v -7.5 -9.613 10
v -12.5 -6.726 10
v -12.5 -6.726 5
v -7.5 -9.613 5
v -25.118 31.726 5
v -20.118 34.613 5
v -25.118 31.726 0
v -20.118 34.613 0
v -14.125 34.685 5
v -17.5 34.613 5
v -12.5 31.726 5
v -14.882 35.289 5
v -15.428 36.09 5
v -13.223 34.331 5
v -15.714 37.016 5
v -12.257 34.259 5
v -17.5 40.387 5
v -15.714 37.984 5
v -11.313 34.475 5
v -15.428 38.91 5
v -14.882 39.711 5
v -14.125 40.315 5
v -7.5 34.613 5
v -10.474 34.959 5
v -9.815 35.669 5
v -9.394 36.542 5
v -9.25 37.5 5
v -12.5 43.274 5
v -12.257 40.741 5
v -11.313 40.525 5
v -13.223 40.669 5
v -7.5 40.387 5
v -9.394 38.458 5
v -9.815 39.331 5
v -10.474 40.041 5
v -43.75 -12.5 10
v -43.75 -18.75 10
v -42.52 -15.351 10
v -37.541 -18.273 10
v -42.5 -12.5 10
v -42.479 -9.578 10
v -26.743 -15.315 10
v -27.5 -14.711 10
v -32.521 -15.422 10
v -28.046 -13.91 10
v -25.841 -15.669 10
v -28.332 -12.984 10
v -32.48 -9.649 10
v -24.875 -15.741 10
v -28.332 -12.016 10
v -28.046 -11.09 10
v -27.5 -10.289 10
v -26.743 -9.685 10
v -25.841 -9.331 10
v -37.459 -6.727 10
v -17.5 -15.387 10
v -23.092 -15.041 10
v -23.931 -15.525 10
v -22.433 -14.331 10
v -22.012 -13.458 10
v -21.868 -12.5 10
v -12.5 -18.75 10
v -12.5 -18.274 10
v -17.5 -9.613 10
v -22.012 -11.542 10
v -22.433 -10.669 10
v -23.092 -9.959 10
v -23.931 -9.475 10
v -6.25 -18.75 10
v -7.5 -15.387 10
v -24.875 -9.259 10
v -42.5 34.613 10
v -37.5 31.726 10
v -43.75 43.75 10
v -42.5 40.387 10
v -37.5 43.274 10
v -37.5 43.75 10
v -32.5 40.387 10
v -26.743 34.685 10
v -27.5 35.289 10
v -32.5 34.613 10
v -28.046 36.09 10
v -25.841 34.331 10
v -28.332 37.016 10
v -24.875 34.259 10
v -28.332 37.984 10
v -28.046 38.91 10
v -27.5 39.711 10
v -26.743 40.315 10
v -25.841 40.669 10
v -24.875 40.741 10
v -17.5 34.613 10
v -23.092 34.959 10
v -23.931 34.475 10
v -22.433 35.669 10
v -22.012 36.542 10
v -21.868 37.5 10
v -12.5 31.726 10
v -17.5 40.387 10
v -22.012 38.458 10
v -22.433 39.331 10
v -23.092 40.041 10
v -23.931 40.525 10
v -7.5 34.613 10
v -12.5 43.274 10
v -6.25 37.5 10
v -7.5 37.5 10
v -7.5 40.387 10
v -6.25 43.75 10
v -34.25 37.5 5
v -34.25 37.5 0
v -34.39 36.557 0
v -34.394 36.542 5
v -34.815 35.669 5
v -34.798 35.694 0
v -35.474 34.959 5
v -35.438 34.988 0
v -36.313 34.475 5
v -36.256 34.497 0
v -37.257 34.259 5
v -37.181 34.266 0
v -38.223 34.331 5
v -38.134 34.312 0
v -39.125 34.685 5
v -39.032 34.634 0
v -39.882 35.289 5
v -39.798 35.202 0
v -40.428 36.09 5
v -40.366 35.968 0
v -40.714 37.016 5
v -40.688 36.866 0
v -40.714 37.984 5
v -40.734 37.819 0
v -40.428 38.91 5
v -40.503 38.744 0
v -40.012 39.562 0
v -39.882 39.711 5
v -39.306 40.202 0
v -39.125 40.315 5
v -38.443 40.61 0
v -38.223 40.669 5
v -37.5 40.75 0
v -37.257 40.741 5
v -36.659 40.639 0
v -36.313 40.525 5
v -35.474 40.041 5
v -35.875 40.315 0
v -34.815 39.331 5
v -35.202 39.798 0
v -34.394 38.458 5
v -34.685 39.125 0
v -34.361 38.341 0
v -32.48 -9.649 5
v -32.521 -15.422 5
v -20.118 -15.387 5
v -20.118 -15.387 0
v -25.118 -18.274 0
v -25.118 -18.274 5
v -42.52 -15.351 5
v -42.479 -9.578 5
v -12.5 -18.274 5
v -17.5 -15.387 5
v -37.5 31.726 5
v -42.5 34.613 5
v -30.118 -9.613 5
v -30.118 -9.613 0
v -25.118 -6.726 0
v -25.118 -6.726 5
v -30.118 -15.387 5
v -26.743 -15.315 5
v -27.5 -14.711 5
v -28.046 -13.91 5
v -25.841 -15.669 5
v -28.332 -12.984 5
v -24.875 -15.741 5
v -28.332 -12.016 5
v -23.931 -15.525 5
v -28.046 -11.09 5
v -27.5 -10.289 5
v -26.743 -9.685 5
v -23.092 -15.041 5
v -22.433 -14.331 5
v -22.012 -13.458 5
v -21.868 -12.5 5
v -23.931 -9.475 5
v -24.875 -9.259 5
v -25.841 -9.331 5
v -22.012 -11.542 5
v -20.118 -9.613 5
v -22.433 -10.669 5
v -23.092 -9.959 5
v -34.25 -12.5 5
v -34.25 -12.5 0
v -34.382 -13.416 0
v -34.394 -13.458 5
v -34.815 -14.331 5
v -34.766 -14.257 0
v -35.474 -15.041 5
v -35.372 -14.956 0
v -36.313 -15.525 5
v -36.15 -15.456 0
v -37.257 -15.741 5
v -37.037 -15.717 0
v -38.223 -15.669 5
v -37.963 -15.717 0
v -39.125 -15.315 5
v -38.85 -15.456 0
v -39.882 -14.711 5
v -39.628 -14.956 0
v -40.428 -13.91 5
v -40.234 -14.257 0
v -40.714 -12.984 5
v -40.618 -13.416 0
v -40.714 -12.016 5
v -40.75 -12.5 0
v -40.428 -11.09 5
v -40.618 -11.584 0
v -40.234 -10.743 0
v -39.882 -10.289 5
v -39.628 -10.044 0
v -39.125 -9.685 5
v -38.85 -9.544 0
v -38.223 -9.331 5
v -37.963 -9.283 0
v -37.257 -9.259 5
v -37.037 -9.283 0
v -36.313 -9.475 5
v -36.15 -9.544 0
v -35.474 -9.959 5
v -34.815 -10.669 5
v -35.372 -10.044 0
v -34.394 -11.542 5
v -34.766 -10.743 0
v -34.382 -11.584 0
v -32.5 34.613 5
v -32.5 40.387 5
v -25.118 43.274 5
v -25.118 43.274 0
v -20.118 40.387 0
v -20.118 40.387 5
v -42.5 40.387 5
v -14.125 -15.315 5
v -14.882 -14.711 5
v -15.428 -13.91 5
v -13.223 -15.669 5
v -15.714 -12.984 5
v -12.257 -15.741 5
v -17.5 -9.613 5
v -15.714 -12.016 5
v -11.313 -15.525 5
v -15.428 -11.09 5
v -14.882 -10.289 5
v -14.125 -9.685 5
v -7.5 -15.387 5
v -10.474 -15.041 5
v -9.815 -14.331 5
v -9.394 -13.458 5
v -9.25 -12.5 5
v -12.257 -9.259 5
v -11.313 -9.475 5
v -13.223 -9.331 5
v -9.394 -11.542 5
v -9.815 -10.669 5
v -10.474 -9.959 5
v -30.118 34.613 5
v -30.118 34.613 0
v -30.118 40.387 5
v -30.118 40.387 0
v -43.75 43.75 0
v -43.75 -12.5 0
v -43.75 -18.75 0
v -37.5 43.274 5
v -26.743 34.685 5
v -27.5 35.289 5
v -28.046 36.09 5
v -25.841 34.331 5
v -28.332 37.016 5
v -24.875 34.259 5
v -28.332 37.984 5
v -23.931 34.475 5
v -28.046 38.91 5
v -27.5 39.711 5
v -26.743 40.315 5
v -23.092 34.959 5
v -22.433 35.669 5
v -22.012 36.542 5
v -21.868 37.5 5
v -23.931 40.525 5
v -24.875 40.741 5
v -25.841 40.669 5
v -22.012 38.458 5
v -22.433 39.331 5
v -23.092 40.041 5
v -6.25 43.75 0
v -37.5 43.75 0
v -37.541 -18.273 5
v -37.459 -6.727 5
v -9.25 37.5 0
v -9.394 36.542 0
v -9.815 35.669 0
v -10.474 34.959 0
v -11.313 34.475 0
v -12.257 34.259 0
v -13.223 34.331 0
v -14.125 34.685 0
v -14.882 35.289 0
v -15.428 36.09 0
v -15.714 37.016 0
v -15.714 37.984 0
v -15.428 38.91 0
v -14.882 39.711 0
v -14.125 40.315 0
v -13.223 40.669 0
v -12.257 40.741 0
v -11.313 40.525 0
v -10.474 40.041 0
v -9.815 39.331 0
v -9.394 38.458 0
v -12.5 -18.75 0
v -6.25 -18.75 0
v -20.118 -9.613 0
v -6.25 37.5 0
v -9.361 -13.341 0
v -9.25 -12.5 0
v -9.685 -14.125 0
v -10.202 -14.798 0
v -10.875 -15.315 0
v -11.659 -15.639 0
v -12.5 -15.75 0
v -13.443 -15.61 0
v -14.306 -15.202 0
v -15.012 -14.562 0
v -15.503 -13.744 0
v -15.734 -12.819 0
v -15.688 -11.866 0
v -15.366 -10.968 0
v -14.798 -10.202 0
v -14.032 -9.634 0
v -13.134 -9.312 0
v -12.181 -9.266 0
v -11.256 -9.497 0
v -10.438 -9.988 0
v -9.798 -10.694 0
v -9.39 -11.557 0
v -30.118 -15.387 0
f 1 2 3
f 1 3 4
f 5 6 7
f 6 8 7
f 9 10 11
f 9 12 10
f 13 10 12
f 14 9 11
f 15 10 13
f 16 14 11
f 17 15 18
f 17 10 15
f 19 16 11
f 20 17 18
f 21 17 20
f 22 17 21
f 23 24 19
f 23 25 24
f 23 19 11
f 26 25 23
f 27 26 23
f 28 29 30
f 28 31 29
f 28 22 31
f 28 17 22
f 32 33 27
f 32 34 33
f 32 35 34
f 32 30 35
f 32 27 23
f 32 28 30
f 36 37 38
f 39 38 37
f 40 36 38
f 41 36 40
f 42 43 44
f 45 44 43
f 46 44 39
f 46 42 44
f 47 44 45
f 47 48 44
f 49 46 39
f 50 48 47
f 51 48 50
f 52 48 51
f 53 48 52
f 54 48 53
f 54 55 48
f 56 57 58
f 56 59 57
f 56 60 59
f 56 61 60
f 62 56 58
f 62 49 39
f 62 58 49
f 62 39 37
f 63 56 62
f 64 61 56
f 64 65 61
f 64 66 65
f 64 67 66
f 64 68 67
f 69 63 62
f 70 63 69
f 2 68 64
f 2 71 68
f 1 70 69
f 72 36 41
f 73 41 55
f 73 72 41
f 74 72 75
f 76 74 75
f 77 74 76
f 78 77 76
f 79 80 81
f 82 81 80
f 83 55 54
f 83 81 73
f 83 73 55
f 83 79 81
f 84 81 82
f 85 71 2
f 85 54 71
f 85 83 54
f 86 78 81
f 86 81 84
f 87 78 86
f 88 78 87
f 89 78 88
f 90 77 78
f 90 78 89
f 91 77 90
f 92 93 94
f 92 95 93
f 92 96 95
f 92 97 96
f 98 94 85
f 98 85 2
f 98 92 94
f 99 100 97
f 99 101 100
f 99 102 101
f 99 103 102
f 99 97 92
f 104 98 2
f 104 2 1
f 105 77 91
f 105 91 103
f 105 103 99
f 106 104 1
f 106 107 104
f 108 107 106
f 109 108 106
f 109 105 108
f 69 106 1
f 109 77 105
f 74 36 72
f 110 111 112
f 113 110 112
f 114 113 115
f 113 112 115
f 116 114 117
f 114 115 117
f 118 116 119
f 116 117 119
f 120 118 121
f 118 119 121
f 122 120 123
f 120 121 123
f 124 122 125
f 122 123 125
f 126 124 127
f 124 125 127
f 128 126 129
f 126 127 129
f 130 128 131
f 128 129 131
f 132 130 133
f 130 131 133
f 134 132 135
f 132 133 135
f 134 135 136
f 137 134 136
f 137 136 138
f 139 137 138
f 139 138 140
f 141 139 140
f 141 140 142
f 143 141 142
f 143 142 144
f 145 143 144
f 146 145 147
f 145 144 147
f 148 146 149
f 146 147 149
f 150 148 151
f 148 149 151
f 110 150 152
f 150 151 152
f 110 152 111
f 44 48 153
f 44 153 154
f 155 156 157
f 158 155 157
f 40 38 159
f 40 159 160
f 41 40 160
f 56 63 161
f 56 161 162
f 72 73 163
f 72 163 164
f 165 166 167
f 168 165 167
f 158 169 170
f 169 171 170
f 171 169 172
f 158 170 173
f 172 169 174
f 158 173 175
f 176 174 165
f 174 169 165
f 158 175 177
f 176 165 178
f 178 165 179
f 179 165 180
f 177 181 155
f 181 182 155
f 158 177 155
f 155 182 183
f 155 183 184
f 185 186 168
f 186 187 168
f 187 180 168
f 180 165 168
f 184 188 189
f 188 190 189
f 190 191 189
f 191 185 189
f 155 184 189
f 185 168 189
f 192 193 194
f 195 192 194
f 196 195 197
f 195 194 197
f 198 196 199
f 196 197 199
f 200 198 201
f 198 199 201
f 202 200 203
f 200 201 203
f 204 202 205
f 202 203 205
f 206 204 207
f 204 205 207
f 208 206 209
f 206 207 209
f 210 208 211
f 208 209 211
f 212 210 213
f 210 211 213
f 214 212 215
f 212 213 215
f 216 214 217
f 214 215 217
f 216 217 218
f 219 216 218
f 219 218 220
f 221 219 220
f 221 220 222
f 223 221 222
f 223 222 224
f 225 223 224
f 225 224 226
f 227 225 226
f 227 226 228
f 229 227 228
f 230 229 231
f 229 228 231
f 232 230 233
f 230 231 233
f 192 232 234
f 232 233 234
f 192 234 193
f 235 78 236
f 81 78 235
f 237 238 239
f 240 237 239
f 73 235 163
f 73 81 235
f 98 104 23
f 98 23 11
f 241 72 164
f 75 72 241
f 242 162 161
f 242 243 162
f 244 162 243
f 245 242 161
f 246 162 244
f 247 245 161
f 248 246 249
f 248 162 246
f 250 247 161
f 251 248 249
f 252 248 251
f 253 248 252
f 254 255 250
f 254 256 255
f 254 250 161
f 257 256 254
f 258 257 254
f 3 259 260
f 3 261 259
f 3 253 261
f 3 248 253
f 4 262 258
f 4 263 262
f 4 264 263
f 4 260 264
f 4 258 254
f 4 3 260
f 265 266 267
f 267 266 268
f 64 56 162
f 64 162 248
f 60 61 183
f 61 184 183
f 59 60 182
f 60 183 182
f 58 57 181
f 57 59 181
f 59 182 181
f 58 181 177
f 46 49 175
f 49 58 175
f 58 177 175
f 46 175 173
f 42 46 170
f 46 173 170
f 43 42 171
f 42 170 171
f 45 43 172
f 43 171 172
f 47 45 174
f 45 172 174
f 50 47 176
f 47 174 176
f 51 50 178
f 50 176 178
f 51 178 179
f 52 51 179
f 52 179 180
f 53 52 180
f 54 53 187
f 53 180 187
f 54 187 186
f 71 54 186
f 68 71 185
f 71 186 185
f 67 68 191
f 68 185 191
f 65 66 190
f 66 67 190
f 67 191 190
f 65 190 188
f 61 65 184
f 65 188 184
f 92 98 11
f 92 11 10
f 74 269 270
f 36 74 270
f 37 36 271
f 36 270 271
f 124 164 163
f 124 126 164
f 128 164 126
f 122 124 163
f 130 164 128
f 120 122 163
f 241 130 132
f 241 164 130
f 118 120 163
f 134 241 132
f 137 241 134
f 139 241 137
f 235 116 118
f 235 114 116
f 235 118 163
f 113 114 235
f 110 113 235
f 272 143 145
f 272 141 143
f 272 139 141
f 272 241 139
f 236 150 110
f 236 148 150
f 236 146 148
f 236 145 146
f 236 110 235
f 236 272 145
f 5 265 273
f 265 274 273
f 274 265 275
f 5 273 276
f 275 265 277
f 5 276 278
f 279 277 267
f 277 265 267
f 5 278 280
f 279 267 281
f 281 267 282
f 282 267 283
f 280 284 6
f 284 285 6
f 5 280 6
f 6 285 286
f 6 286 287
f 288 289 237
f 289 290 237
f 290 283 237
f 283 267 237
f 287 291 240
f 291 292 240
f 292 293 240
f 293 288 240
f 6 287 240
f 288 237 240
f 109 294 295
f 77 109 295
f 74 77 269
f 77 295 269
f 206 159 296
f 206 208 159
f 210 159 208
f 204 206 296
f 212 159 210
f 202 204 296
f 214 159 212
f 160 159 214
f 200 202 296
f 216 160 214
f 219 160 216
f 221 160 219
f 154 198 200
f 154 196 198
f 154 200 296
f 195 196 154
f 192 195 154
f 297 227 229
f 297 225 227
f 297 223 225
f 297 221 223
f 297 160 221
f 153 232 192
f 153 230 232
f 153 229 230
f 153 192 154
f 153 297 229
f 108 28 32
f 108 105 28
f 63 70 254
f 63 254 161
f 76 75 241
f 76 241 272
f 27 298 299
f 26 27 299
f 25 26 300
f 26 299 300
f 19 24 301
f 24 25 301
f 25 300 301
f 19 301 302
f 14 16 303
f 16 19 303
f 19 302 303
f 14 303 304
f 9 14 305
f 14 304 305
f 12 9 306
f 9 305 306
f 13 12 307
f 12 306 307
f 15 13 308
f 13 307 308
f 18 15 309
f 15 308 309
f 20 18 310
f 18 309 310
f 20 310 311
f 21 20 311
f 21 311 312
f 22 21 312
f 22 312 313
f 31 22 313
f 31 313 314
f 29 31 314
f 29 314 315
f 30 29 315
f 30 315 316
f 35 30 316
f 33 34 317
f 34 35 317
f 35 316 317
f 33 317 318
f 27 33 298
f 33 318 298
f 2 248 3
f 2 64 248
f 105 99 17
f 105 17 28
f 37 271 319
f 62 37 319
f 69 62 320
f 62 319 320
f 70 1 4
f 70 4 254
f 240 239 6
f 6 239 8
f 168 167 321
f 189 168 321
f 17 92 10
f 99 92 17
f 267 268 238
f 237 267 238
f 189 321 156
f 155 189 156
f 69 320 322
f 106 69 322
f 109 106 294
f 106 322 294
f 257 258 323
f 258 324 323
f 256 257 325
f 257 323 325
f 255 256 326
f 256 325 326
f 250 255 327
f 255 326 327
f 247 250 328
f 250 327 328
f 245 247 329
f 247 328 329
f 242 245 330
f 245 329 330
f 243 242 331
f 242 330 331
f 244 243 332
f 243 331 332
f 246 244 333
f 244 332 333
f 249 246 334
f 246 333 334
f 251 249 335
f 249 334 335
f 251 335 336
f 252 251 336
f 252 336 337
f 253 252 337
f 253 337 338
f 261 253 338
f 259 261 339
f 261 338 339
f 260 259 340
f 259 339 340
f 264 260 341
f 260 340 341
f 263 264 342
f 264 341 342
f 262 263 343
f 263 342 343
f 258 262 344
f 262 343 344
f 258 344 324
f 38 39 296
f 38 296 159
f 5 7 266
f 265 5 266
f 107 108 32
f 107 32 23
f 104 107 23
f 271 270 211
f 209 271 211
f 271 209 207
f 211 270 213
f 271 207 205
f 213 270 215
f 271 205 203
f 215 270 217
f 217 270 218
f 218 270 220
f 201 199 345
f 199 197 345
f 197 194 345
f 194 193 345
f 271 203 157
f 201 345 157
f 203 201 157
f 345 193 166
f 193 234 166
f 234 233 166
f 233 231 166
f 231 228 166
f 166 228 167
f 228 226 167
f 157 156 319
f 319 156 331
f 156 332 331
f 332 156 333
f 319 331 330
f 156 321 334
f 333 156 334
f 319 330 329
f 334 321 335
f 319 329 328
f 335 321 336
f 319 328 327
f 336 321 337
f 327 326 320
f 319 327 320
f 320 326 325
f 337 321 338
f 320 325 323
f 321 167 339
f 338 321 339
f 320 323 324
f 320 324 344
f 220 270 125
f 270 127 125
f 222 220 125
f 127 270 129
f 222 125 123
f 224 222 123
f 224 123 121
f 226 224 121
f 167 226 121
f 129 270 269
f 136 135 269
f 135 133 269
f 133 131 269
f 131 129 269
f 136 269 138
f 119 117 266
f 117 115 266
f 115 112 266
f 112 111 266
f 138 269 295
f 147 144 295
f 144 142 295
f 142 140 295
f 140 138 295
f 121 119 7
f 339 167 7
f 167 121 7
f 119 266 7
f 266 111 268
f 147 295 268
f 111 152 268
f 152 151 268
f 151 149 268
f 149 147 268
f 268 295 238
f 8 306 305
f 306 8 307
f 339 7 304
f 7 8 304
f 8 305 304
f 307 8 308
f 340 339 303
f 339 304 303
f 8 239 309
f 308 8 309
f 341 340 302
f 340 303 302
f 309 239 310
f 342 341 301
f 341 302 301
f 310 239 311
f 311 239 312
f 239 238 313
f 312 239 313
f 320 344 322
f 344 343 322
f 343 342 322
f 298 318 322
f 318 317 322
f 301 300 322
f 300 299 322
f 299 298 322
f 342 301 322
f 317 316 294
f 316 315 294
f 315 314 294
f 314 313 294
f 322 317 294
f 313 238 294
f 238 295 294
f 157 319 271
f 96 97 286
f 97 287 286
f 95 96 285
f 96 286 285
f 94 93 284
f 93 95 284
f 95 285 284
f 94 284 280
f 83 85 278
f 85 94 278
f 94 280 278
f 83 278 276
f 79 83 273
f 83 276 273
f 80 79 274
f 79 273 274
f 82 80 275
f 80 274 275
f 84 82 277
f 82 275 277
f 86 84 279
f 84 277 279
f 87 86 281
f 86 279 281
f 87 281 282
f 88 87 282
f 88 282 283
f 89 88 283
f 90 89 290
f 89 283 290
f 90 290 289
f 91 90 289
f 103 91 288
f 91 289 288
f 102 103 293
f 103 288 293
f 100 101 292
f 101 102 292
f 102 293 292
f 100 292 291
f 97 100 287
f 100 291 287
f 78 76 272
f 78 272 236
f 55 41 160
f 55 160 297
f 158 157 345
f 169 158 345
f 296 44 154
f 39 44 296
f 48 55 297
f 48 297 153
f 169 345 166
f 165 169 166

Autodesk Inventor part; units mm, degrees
ref_plane "YZ Plane" through (0, 0, 0) normal (1, 0, 0) x (0, 1, 0)
ref_plane "XZ Plane" through (0, 0, 0) normal (0, 1, 0) x (-1, 0, 0)
ref_plane "XY Plane" through (0, 0, 0) normal (0, 0, 1) x (1, 0, 0)
sketch "Sketch1" plane through (0, 0, 0) normal (0, 0, 1) x (1, 0, 0)
  line L0 (-6.25, 43.75) -> (-43.75, 43.75)
  line L1 (-43.75, 43.75) -> (-43.75, -18.75)
  line L2 (-43.75, -18.75) -> (-6.25, -18.75)
  line L3 (-6.25, -18.75) -> (-6.25, 43.75)
  circle A0 centre (-12.5, 37.5) radius 3.25
  circle A1 centre (-37.5, 37.5) radius 3.25
  circle A2 centre (-37.5, -12.5) radius 3.25
  line L4 (-12.5, 37.5) -> (-6.25, 37.5)
  line L5 (-12.5, -12.5) -> (-12.5, -18.75)
  line L6 (-37.5, 37.5) -> (-37.5, 43.75)
  line L7 (-37.5, -12.5) -> (-43.75, -12.5)
  circle A3 centre (-12.5, -12.5) radius 3.25
  circle A4 centre (-25.1179, 37.5) radius 3.25
  circle A5 centre (-25.1179, -12.5) radius 3.25
  line L8 (-25.1179, 31.7265) -> (-30.1179, 34.6132)
  line L9 (-30.1179, 34.6132) -> (-30.1179, 40.3868)
  line L10 (-30.1179, 40.3868) -> (-25.1179, 43.2735)
  line L11 (-25.1179, 43.2735) -> (-20.1179, 40.3868)
  line L12 (-20.1179, 40.3868) -> (-20.1179, 34.6132)
  line L13 (-20.1179, 34.6132) -> (-25.1179, 31.7265)
  line L14 (-25.1179, -6.7265) -> (-20.1179, -9.6132)
  line L15 (-20.1179, -9.6132) -> (-20.1179, -15.3868)
  line L16 (-20.1179, -15.3868) -> (-25.1179, -18.2735)
  line L17 (-25.1179, -18.2735) -> (-30.1179, -15.3868)
  line L18 (-30.1179, -15.3868) -> (-30.1179, -9.6132)
  line L19 (-30.1179, -9.6132) -> (-25.1179, -6.7265)
  point P0 (0, 0)
  point P1 (-20.1179, 37.5)
  point P2 (-30.1179, 37.5)
  point P3 (-20.1179, -12.5)
  point P4 (-30.1179, -12.5)
  dimension "d1" = 6.25
  dimension "d42" = 6.5
  dimension "d43" = 6.5
  dimension "d44" = 10
  dimension "d45" = 10
extrude "Extrusion1" add sketch "Sketch1" along normal blind 10 contours L3 L2 L1 L0 | L8 L9 L10 L11 L12 L13 | L14 L15 L16 L17 L18 L19
sketch "Sketch2" plane through (0, 0, 10) normal (0, 0, 1) x (1, 0, 0)
  circle A0 centre (-12.5, 37.5) radius 3.25 projected
  circle A1 centre (-37.5, 37.5) radius 3.25 projected
  circle A2 centre (-37.5, -12.5) radius 3.25 projected
  circle A3 centre (-12.5, -12.5) radius 3.25 projected
  line L0 (-12.5, 31.7265) -> (-17.5, 34.6132)
  line L1 (-17.5, 34.6132) -> (-17.5, 40.3868)
  line L2 (-17.5, 40.3868) -> (-12.5, 43.2735)
  line L3 (-12.5, 43.2735) -> (-7.5, 40.3868)
  line L4 (-7.5, 40.3868) -> (-7.5, 34.6132)
  line L5 (-7.5, 34.6132) -> (-12.5, 31.7265)
  line L6 (-37.5, 31.7265) -> (-42.5, 34.6132)
  line L7 (-42.5, 34.6132) -> (-42.5, 40.3868)
  line L8 (-42.5, 40.3868) -> (-37.5, 43.2735)
  line L9 (-37.5, 43.2735) -> (-32.5, 40.3868)
  line L10 (-32.5, 40.3868) -> (-32.5, 34.6132)
  line L11 (-32.5, 34.6132) -> (-37.5, 31.7265)
  line L12 (-32.5208, -15.4225) -> (-37.5413, -18.2734)
  line L13 (-37.5413, -18.2734) -> (-42.5205, -15.3509)
  line L14 (-42.5205, -15.3509) -> (-42.4792, -9.5775)
  line L15 (-42.4792, -9.5775) -> (-37.4587, -6.7266)
  line L16 (-37.4587, -6.7266) -> (-32.4795, -9.6491)
  line L17 (-32.4795, -9.6491) -> (-32.5208, -15.4225)
  line L18 (-12.5, -6.7265) -> (-7.5, -9.6132)
  line L19 (-7.5, -9.6132) -> (-7.5, -15.3868)
  line L20 (-7.5, -15.3868) -> (-12.5, -18.2735)
  line L21 (-12.5, -18.2735) -> (-17.5, -15.3868)
  line L22 (-17.5, -15.3868) -> (-17.5, -9.6132)
  line L23 (-17.5, -9.6132) -> (-12.5, -6.7265)
  dimension "d33" = 10
  dimension "d34" = 10
  dimension "d35" = 10
  dimension "d36" = 10
extrude "Extrusion2" cut sketch "Sketch2" against normal blind 5
extrude "Extrusion5" cut sketch "Sketch1" along normal blind 5 contours L8 L9 L10 L11 L12 L13 | L14 L15 L16 L17 L18 L19
properties part number "print_head_mount"
